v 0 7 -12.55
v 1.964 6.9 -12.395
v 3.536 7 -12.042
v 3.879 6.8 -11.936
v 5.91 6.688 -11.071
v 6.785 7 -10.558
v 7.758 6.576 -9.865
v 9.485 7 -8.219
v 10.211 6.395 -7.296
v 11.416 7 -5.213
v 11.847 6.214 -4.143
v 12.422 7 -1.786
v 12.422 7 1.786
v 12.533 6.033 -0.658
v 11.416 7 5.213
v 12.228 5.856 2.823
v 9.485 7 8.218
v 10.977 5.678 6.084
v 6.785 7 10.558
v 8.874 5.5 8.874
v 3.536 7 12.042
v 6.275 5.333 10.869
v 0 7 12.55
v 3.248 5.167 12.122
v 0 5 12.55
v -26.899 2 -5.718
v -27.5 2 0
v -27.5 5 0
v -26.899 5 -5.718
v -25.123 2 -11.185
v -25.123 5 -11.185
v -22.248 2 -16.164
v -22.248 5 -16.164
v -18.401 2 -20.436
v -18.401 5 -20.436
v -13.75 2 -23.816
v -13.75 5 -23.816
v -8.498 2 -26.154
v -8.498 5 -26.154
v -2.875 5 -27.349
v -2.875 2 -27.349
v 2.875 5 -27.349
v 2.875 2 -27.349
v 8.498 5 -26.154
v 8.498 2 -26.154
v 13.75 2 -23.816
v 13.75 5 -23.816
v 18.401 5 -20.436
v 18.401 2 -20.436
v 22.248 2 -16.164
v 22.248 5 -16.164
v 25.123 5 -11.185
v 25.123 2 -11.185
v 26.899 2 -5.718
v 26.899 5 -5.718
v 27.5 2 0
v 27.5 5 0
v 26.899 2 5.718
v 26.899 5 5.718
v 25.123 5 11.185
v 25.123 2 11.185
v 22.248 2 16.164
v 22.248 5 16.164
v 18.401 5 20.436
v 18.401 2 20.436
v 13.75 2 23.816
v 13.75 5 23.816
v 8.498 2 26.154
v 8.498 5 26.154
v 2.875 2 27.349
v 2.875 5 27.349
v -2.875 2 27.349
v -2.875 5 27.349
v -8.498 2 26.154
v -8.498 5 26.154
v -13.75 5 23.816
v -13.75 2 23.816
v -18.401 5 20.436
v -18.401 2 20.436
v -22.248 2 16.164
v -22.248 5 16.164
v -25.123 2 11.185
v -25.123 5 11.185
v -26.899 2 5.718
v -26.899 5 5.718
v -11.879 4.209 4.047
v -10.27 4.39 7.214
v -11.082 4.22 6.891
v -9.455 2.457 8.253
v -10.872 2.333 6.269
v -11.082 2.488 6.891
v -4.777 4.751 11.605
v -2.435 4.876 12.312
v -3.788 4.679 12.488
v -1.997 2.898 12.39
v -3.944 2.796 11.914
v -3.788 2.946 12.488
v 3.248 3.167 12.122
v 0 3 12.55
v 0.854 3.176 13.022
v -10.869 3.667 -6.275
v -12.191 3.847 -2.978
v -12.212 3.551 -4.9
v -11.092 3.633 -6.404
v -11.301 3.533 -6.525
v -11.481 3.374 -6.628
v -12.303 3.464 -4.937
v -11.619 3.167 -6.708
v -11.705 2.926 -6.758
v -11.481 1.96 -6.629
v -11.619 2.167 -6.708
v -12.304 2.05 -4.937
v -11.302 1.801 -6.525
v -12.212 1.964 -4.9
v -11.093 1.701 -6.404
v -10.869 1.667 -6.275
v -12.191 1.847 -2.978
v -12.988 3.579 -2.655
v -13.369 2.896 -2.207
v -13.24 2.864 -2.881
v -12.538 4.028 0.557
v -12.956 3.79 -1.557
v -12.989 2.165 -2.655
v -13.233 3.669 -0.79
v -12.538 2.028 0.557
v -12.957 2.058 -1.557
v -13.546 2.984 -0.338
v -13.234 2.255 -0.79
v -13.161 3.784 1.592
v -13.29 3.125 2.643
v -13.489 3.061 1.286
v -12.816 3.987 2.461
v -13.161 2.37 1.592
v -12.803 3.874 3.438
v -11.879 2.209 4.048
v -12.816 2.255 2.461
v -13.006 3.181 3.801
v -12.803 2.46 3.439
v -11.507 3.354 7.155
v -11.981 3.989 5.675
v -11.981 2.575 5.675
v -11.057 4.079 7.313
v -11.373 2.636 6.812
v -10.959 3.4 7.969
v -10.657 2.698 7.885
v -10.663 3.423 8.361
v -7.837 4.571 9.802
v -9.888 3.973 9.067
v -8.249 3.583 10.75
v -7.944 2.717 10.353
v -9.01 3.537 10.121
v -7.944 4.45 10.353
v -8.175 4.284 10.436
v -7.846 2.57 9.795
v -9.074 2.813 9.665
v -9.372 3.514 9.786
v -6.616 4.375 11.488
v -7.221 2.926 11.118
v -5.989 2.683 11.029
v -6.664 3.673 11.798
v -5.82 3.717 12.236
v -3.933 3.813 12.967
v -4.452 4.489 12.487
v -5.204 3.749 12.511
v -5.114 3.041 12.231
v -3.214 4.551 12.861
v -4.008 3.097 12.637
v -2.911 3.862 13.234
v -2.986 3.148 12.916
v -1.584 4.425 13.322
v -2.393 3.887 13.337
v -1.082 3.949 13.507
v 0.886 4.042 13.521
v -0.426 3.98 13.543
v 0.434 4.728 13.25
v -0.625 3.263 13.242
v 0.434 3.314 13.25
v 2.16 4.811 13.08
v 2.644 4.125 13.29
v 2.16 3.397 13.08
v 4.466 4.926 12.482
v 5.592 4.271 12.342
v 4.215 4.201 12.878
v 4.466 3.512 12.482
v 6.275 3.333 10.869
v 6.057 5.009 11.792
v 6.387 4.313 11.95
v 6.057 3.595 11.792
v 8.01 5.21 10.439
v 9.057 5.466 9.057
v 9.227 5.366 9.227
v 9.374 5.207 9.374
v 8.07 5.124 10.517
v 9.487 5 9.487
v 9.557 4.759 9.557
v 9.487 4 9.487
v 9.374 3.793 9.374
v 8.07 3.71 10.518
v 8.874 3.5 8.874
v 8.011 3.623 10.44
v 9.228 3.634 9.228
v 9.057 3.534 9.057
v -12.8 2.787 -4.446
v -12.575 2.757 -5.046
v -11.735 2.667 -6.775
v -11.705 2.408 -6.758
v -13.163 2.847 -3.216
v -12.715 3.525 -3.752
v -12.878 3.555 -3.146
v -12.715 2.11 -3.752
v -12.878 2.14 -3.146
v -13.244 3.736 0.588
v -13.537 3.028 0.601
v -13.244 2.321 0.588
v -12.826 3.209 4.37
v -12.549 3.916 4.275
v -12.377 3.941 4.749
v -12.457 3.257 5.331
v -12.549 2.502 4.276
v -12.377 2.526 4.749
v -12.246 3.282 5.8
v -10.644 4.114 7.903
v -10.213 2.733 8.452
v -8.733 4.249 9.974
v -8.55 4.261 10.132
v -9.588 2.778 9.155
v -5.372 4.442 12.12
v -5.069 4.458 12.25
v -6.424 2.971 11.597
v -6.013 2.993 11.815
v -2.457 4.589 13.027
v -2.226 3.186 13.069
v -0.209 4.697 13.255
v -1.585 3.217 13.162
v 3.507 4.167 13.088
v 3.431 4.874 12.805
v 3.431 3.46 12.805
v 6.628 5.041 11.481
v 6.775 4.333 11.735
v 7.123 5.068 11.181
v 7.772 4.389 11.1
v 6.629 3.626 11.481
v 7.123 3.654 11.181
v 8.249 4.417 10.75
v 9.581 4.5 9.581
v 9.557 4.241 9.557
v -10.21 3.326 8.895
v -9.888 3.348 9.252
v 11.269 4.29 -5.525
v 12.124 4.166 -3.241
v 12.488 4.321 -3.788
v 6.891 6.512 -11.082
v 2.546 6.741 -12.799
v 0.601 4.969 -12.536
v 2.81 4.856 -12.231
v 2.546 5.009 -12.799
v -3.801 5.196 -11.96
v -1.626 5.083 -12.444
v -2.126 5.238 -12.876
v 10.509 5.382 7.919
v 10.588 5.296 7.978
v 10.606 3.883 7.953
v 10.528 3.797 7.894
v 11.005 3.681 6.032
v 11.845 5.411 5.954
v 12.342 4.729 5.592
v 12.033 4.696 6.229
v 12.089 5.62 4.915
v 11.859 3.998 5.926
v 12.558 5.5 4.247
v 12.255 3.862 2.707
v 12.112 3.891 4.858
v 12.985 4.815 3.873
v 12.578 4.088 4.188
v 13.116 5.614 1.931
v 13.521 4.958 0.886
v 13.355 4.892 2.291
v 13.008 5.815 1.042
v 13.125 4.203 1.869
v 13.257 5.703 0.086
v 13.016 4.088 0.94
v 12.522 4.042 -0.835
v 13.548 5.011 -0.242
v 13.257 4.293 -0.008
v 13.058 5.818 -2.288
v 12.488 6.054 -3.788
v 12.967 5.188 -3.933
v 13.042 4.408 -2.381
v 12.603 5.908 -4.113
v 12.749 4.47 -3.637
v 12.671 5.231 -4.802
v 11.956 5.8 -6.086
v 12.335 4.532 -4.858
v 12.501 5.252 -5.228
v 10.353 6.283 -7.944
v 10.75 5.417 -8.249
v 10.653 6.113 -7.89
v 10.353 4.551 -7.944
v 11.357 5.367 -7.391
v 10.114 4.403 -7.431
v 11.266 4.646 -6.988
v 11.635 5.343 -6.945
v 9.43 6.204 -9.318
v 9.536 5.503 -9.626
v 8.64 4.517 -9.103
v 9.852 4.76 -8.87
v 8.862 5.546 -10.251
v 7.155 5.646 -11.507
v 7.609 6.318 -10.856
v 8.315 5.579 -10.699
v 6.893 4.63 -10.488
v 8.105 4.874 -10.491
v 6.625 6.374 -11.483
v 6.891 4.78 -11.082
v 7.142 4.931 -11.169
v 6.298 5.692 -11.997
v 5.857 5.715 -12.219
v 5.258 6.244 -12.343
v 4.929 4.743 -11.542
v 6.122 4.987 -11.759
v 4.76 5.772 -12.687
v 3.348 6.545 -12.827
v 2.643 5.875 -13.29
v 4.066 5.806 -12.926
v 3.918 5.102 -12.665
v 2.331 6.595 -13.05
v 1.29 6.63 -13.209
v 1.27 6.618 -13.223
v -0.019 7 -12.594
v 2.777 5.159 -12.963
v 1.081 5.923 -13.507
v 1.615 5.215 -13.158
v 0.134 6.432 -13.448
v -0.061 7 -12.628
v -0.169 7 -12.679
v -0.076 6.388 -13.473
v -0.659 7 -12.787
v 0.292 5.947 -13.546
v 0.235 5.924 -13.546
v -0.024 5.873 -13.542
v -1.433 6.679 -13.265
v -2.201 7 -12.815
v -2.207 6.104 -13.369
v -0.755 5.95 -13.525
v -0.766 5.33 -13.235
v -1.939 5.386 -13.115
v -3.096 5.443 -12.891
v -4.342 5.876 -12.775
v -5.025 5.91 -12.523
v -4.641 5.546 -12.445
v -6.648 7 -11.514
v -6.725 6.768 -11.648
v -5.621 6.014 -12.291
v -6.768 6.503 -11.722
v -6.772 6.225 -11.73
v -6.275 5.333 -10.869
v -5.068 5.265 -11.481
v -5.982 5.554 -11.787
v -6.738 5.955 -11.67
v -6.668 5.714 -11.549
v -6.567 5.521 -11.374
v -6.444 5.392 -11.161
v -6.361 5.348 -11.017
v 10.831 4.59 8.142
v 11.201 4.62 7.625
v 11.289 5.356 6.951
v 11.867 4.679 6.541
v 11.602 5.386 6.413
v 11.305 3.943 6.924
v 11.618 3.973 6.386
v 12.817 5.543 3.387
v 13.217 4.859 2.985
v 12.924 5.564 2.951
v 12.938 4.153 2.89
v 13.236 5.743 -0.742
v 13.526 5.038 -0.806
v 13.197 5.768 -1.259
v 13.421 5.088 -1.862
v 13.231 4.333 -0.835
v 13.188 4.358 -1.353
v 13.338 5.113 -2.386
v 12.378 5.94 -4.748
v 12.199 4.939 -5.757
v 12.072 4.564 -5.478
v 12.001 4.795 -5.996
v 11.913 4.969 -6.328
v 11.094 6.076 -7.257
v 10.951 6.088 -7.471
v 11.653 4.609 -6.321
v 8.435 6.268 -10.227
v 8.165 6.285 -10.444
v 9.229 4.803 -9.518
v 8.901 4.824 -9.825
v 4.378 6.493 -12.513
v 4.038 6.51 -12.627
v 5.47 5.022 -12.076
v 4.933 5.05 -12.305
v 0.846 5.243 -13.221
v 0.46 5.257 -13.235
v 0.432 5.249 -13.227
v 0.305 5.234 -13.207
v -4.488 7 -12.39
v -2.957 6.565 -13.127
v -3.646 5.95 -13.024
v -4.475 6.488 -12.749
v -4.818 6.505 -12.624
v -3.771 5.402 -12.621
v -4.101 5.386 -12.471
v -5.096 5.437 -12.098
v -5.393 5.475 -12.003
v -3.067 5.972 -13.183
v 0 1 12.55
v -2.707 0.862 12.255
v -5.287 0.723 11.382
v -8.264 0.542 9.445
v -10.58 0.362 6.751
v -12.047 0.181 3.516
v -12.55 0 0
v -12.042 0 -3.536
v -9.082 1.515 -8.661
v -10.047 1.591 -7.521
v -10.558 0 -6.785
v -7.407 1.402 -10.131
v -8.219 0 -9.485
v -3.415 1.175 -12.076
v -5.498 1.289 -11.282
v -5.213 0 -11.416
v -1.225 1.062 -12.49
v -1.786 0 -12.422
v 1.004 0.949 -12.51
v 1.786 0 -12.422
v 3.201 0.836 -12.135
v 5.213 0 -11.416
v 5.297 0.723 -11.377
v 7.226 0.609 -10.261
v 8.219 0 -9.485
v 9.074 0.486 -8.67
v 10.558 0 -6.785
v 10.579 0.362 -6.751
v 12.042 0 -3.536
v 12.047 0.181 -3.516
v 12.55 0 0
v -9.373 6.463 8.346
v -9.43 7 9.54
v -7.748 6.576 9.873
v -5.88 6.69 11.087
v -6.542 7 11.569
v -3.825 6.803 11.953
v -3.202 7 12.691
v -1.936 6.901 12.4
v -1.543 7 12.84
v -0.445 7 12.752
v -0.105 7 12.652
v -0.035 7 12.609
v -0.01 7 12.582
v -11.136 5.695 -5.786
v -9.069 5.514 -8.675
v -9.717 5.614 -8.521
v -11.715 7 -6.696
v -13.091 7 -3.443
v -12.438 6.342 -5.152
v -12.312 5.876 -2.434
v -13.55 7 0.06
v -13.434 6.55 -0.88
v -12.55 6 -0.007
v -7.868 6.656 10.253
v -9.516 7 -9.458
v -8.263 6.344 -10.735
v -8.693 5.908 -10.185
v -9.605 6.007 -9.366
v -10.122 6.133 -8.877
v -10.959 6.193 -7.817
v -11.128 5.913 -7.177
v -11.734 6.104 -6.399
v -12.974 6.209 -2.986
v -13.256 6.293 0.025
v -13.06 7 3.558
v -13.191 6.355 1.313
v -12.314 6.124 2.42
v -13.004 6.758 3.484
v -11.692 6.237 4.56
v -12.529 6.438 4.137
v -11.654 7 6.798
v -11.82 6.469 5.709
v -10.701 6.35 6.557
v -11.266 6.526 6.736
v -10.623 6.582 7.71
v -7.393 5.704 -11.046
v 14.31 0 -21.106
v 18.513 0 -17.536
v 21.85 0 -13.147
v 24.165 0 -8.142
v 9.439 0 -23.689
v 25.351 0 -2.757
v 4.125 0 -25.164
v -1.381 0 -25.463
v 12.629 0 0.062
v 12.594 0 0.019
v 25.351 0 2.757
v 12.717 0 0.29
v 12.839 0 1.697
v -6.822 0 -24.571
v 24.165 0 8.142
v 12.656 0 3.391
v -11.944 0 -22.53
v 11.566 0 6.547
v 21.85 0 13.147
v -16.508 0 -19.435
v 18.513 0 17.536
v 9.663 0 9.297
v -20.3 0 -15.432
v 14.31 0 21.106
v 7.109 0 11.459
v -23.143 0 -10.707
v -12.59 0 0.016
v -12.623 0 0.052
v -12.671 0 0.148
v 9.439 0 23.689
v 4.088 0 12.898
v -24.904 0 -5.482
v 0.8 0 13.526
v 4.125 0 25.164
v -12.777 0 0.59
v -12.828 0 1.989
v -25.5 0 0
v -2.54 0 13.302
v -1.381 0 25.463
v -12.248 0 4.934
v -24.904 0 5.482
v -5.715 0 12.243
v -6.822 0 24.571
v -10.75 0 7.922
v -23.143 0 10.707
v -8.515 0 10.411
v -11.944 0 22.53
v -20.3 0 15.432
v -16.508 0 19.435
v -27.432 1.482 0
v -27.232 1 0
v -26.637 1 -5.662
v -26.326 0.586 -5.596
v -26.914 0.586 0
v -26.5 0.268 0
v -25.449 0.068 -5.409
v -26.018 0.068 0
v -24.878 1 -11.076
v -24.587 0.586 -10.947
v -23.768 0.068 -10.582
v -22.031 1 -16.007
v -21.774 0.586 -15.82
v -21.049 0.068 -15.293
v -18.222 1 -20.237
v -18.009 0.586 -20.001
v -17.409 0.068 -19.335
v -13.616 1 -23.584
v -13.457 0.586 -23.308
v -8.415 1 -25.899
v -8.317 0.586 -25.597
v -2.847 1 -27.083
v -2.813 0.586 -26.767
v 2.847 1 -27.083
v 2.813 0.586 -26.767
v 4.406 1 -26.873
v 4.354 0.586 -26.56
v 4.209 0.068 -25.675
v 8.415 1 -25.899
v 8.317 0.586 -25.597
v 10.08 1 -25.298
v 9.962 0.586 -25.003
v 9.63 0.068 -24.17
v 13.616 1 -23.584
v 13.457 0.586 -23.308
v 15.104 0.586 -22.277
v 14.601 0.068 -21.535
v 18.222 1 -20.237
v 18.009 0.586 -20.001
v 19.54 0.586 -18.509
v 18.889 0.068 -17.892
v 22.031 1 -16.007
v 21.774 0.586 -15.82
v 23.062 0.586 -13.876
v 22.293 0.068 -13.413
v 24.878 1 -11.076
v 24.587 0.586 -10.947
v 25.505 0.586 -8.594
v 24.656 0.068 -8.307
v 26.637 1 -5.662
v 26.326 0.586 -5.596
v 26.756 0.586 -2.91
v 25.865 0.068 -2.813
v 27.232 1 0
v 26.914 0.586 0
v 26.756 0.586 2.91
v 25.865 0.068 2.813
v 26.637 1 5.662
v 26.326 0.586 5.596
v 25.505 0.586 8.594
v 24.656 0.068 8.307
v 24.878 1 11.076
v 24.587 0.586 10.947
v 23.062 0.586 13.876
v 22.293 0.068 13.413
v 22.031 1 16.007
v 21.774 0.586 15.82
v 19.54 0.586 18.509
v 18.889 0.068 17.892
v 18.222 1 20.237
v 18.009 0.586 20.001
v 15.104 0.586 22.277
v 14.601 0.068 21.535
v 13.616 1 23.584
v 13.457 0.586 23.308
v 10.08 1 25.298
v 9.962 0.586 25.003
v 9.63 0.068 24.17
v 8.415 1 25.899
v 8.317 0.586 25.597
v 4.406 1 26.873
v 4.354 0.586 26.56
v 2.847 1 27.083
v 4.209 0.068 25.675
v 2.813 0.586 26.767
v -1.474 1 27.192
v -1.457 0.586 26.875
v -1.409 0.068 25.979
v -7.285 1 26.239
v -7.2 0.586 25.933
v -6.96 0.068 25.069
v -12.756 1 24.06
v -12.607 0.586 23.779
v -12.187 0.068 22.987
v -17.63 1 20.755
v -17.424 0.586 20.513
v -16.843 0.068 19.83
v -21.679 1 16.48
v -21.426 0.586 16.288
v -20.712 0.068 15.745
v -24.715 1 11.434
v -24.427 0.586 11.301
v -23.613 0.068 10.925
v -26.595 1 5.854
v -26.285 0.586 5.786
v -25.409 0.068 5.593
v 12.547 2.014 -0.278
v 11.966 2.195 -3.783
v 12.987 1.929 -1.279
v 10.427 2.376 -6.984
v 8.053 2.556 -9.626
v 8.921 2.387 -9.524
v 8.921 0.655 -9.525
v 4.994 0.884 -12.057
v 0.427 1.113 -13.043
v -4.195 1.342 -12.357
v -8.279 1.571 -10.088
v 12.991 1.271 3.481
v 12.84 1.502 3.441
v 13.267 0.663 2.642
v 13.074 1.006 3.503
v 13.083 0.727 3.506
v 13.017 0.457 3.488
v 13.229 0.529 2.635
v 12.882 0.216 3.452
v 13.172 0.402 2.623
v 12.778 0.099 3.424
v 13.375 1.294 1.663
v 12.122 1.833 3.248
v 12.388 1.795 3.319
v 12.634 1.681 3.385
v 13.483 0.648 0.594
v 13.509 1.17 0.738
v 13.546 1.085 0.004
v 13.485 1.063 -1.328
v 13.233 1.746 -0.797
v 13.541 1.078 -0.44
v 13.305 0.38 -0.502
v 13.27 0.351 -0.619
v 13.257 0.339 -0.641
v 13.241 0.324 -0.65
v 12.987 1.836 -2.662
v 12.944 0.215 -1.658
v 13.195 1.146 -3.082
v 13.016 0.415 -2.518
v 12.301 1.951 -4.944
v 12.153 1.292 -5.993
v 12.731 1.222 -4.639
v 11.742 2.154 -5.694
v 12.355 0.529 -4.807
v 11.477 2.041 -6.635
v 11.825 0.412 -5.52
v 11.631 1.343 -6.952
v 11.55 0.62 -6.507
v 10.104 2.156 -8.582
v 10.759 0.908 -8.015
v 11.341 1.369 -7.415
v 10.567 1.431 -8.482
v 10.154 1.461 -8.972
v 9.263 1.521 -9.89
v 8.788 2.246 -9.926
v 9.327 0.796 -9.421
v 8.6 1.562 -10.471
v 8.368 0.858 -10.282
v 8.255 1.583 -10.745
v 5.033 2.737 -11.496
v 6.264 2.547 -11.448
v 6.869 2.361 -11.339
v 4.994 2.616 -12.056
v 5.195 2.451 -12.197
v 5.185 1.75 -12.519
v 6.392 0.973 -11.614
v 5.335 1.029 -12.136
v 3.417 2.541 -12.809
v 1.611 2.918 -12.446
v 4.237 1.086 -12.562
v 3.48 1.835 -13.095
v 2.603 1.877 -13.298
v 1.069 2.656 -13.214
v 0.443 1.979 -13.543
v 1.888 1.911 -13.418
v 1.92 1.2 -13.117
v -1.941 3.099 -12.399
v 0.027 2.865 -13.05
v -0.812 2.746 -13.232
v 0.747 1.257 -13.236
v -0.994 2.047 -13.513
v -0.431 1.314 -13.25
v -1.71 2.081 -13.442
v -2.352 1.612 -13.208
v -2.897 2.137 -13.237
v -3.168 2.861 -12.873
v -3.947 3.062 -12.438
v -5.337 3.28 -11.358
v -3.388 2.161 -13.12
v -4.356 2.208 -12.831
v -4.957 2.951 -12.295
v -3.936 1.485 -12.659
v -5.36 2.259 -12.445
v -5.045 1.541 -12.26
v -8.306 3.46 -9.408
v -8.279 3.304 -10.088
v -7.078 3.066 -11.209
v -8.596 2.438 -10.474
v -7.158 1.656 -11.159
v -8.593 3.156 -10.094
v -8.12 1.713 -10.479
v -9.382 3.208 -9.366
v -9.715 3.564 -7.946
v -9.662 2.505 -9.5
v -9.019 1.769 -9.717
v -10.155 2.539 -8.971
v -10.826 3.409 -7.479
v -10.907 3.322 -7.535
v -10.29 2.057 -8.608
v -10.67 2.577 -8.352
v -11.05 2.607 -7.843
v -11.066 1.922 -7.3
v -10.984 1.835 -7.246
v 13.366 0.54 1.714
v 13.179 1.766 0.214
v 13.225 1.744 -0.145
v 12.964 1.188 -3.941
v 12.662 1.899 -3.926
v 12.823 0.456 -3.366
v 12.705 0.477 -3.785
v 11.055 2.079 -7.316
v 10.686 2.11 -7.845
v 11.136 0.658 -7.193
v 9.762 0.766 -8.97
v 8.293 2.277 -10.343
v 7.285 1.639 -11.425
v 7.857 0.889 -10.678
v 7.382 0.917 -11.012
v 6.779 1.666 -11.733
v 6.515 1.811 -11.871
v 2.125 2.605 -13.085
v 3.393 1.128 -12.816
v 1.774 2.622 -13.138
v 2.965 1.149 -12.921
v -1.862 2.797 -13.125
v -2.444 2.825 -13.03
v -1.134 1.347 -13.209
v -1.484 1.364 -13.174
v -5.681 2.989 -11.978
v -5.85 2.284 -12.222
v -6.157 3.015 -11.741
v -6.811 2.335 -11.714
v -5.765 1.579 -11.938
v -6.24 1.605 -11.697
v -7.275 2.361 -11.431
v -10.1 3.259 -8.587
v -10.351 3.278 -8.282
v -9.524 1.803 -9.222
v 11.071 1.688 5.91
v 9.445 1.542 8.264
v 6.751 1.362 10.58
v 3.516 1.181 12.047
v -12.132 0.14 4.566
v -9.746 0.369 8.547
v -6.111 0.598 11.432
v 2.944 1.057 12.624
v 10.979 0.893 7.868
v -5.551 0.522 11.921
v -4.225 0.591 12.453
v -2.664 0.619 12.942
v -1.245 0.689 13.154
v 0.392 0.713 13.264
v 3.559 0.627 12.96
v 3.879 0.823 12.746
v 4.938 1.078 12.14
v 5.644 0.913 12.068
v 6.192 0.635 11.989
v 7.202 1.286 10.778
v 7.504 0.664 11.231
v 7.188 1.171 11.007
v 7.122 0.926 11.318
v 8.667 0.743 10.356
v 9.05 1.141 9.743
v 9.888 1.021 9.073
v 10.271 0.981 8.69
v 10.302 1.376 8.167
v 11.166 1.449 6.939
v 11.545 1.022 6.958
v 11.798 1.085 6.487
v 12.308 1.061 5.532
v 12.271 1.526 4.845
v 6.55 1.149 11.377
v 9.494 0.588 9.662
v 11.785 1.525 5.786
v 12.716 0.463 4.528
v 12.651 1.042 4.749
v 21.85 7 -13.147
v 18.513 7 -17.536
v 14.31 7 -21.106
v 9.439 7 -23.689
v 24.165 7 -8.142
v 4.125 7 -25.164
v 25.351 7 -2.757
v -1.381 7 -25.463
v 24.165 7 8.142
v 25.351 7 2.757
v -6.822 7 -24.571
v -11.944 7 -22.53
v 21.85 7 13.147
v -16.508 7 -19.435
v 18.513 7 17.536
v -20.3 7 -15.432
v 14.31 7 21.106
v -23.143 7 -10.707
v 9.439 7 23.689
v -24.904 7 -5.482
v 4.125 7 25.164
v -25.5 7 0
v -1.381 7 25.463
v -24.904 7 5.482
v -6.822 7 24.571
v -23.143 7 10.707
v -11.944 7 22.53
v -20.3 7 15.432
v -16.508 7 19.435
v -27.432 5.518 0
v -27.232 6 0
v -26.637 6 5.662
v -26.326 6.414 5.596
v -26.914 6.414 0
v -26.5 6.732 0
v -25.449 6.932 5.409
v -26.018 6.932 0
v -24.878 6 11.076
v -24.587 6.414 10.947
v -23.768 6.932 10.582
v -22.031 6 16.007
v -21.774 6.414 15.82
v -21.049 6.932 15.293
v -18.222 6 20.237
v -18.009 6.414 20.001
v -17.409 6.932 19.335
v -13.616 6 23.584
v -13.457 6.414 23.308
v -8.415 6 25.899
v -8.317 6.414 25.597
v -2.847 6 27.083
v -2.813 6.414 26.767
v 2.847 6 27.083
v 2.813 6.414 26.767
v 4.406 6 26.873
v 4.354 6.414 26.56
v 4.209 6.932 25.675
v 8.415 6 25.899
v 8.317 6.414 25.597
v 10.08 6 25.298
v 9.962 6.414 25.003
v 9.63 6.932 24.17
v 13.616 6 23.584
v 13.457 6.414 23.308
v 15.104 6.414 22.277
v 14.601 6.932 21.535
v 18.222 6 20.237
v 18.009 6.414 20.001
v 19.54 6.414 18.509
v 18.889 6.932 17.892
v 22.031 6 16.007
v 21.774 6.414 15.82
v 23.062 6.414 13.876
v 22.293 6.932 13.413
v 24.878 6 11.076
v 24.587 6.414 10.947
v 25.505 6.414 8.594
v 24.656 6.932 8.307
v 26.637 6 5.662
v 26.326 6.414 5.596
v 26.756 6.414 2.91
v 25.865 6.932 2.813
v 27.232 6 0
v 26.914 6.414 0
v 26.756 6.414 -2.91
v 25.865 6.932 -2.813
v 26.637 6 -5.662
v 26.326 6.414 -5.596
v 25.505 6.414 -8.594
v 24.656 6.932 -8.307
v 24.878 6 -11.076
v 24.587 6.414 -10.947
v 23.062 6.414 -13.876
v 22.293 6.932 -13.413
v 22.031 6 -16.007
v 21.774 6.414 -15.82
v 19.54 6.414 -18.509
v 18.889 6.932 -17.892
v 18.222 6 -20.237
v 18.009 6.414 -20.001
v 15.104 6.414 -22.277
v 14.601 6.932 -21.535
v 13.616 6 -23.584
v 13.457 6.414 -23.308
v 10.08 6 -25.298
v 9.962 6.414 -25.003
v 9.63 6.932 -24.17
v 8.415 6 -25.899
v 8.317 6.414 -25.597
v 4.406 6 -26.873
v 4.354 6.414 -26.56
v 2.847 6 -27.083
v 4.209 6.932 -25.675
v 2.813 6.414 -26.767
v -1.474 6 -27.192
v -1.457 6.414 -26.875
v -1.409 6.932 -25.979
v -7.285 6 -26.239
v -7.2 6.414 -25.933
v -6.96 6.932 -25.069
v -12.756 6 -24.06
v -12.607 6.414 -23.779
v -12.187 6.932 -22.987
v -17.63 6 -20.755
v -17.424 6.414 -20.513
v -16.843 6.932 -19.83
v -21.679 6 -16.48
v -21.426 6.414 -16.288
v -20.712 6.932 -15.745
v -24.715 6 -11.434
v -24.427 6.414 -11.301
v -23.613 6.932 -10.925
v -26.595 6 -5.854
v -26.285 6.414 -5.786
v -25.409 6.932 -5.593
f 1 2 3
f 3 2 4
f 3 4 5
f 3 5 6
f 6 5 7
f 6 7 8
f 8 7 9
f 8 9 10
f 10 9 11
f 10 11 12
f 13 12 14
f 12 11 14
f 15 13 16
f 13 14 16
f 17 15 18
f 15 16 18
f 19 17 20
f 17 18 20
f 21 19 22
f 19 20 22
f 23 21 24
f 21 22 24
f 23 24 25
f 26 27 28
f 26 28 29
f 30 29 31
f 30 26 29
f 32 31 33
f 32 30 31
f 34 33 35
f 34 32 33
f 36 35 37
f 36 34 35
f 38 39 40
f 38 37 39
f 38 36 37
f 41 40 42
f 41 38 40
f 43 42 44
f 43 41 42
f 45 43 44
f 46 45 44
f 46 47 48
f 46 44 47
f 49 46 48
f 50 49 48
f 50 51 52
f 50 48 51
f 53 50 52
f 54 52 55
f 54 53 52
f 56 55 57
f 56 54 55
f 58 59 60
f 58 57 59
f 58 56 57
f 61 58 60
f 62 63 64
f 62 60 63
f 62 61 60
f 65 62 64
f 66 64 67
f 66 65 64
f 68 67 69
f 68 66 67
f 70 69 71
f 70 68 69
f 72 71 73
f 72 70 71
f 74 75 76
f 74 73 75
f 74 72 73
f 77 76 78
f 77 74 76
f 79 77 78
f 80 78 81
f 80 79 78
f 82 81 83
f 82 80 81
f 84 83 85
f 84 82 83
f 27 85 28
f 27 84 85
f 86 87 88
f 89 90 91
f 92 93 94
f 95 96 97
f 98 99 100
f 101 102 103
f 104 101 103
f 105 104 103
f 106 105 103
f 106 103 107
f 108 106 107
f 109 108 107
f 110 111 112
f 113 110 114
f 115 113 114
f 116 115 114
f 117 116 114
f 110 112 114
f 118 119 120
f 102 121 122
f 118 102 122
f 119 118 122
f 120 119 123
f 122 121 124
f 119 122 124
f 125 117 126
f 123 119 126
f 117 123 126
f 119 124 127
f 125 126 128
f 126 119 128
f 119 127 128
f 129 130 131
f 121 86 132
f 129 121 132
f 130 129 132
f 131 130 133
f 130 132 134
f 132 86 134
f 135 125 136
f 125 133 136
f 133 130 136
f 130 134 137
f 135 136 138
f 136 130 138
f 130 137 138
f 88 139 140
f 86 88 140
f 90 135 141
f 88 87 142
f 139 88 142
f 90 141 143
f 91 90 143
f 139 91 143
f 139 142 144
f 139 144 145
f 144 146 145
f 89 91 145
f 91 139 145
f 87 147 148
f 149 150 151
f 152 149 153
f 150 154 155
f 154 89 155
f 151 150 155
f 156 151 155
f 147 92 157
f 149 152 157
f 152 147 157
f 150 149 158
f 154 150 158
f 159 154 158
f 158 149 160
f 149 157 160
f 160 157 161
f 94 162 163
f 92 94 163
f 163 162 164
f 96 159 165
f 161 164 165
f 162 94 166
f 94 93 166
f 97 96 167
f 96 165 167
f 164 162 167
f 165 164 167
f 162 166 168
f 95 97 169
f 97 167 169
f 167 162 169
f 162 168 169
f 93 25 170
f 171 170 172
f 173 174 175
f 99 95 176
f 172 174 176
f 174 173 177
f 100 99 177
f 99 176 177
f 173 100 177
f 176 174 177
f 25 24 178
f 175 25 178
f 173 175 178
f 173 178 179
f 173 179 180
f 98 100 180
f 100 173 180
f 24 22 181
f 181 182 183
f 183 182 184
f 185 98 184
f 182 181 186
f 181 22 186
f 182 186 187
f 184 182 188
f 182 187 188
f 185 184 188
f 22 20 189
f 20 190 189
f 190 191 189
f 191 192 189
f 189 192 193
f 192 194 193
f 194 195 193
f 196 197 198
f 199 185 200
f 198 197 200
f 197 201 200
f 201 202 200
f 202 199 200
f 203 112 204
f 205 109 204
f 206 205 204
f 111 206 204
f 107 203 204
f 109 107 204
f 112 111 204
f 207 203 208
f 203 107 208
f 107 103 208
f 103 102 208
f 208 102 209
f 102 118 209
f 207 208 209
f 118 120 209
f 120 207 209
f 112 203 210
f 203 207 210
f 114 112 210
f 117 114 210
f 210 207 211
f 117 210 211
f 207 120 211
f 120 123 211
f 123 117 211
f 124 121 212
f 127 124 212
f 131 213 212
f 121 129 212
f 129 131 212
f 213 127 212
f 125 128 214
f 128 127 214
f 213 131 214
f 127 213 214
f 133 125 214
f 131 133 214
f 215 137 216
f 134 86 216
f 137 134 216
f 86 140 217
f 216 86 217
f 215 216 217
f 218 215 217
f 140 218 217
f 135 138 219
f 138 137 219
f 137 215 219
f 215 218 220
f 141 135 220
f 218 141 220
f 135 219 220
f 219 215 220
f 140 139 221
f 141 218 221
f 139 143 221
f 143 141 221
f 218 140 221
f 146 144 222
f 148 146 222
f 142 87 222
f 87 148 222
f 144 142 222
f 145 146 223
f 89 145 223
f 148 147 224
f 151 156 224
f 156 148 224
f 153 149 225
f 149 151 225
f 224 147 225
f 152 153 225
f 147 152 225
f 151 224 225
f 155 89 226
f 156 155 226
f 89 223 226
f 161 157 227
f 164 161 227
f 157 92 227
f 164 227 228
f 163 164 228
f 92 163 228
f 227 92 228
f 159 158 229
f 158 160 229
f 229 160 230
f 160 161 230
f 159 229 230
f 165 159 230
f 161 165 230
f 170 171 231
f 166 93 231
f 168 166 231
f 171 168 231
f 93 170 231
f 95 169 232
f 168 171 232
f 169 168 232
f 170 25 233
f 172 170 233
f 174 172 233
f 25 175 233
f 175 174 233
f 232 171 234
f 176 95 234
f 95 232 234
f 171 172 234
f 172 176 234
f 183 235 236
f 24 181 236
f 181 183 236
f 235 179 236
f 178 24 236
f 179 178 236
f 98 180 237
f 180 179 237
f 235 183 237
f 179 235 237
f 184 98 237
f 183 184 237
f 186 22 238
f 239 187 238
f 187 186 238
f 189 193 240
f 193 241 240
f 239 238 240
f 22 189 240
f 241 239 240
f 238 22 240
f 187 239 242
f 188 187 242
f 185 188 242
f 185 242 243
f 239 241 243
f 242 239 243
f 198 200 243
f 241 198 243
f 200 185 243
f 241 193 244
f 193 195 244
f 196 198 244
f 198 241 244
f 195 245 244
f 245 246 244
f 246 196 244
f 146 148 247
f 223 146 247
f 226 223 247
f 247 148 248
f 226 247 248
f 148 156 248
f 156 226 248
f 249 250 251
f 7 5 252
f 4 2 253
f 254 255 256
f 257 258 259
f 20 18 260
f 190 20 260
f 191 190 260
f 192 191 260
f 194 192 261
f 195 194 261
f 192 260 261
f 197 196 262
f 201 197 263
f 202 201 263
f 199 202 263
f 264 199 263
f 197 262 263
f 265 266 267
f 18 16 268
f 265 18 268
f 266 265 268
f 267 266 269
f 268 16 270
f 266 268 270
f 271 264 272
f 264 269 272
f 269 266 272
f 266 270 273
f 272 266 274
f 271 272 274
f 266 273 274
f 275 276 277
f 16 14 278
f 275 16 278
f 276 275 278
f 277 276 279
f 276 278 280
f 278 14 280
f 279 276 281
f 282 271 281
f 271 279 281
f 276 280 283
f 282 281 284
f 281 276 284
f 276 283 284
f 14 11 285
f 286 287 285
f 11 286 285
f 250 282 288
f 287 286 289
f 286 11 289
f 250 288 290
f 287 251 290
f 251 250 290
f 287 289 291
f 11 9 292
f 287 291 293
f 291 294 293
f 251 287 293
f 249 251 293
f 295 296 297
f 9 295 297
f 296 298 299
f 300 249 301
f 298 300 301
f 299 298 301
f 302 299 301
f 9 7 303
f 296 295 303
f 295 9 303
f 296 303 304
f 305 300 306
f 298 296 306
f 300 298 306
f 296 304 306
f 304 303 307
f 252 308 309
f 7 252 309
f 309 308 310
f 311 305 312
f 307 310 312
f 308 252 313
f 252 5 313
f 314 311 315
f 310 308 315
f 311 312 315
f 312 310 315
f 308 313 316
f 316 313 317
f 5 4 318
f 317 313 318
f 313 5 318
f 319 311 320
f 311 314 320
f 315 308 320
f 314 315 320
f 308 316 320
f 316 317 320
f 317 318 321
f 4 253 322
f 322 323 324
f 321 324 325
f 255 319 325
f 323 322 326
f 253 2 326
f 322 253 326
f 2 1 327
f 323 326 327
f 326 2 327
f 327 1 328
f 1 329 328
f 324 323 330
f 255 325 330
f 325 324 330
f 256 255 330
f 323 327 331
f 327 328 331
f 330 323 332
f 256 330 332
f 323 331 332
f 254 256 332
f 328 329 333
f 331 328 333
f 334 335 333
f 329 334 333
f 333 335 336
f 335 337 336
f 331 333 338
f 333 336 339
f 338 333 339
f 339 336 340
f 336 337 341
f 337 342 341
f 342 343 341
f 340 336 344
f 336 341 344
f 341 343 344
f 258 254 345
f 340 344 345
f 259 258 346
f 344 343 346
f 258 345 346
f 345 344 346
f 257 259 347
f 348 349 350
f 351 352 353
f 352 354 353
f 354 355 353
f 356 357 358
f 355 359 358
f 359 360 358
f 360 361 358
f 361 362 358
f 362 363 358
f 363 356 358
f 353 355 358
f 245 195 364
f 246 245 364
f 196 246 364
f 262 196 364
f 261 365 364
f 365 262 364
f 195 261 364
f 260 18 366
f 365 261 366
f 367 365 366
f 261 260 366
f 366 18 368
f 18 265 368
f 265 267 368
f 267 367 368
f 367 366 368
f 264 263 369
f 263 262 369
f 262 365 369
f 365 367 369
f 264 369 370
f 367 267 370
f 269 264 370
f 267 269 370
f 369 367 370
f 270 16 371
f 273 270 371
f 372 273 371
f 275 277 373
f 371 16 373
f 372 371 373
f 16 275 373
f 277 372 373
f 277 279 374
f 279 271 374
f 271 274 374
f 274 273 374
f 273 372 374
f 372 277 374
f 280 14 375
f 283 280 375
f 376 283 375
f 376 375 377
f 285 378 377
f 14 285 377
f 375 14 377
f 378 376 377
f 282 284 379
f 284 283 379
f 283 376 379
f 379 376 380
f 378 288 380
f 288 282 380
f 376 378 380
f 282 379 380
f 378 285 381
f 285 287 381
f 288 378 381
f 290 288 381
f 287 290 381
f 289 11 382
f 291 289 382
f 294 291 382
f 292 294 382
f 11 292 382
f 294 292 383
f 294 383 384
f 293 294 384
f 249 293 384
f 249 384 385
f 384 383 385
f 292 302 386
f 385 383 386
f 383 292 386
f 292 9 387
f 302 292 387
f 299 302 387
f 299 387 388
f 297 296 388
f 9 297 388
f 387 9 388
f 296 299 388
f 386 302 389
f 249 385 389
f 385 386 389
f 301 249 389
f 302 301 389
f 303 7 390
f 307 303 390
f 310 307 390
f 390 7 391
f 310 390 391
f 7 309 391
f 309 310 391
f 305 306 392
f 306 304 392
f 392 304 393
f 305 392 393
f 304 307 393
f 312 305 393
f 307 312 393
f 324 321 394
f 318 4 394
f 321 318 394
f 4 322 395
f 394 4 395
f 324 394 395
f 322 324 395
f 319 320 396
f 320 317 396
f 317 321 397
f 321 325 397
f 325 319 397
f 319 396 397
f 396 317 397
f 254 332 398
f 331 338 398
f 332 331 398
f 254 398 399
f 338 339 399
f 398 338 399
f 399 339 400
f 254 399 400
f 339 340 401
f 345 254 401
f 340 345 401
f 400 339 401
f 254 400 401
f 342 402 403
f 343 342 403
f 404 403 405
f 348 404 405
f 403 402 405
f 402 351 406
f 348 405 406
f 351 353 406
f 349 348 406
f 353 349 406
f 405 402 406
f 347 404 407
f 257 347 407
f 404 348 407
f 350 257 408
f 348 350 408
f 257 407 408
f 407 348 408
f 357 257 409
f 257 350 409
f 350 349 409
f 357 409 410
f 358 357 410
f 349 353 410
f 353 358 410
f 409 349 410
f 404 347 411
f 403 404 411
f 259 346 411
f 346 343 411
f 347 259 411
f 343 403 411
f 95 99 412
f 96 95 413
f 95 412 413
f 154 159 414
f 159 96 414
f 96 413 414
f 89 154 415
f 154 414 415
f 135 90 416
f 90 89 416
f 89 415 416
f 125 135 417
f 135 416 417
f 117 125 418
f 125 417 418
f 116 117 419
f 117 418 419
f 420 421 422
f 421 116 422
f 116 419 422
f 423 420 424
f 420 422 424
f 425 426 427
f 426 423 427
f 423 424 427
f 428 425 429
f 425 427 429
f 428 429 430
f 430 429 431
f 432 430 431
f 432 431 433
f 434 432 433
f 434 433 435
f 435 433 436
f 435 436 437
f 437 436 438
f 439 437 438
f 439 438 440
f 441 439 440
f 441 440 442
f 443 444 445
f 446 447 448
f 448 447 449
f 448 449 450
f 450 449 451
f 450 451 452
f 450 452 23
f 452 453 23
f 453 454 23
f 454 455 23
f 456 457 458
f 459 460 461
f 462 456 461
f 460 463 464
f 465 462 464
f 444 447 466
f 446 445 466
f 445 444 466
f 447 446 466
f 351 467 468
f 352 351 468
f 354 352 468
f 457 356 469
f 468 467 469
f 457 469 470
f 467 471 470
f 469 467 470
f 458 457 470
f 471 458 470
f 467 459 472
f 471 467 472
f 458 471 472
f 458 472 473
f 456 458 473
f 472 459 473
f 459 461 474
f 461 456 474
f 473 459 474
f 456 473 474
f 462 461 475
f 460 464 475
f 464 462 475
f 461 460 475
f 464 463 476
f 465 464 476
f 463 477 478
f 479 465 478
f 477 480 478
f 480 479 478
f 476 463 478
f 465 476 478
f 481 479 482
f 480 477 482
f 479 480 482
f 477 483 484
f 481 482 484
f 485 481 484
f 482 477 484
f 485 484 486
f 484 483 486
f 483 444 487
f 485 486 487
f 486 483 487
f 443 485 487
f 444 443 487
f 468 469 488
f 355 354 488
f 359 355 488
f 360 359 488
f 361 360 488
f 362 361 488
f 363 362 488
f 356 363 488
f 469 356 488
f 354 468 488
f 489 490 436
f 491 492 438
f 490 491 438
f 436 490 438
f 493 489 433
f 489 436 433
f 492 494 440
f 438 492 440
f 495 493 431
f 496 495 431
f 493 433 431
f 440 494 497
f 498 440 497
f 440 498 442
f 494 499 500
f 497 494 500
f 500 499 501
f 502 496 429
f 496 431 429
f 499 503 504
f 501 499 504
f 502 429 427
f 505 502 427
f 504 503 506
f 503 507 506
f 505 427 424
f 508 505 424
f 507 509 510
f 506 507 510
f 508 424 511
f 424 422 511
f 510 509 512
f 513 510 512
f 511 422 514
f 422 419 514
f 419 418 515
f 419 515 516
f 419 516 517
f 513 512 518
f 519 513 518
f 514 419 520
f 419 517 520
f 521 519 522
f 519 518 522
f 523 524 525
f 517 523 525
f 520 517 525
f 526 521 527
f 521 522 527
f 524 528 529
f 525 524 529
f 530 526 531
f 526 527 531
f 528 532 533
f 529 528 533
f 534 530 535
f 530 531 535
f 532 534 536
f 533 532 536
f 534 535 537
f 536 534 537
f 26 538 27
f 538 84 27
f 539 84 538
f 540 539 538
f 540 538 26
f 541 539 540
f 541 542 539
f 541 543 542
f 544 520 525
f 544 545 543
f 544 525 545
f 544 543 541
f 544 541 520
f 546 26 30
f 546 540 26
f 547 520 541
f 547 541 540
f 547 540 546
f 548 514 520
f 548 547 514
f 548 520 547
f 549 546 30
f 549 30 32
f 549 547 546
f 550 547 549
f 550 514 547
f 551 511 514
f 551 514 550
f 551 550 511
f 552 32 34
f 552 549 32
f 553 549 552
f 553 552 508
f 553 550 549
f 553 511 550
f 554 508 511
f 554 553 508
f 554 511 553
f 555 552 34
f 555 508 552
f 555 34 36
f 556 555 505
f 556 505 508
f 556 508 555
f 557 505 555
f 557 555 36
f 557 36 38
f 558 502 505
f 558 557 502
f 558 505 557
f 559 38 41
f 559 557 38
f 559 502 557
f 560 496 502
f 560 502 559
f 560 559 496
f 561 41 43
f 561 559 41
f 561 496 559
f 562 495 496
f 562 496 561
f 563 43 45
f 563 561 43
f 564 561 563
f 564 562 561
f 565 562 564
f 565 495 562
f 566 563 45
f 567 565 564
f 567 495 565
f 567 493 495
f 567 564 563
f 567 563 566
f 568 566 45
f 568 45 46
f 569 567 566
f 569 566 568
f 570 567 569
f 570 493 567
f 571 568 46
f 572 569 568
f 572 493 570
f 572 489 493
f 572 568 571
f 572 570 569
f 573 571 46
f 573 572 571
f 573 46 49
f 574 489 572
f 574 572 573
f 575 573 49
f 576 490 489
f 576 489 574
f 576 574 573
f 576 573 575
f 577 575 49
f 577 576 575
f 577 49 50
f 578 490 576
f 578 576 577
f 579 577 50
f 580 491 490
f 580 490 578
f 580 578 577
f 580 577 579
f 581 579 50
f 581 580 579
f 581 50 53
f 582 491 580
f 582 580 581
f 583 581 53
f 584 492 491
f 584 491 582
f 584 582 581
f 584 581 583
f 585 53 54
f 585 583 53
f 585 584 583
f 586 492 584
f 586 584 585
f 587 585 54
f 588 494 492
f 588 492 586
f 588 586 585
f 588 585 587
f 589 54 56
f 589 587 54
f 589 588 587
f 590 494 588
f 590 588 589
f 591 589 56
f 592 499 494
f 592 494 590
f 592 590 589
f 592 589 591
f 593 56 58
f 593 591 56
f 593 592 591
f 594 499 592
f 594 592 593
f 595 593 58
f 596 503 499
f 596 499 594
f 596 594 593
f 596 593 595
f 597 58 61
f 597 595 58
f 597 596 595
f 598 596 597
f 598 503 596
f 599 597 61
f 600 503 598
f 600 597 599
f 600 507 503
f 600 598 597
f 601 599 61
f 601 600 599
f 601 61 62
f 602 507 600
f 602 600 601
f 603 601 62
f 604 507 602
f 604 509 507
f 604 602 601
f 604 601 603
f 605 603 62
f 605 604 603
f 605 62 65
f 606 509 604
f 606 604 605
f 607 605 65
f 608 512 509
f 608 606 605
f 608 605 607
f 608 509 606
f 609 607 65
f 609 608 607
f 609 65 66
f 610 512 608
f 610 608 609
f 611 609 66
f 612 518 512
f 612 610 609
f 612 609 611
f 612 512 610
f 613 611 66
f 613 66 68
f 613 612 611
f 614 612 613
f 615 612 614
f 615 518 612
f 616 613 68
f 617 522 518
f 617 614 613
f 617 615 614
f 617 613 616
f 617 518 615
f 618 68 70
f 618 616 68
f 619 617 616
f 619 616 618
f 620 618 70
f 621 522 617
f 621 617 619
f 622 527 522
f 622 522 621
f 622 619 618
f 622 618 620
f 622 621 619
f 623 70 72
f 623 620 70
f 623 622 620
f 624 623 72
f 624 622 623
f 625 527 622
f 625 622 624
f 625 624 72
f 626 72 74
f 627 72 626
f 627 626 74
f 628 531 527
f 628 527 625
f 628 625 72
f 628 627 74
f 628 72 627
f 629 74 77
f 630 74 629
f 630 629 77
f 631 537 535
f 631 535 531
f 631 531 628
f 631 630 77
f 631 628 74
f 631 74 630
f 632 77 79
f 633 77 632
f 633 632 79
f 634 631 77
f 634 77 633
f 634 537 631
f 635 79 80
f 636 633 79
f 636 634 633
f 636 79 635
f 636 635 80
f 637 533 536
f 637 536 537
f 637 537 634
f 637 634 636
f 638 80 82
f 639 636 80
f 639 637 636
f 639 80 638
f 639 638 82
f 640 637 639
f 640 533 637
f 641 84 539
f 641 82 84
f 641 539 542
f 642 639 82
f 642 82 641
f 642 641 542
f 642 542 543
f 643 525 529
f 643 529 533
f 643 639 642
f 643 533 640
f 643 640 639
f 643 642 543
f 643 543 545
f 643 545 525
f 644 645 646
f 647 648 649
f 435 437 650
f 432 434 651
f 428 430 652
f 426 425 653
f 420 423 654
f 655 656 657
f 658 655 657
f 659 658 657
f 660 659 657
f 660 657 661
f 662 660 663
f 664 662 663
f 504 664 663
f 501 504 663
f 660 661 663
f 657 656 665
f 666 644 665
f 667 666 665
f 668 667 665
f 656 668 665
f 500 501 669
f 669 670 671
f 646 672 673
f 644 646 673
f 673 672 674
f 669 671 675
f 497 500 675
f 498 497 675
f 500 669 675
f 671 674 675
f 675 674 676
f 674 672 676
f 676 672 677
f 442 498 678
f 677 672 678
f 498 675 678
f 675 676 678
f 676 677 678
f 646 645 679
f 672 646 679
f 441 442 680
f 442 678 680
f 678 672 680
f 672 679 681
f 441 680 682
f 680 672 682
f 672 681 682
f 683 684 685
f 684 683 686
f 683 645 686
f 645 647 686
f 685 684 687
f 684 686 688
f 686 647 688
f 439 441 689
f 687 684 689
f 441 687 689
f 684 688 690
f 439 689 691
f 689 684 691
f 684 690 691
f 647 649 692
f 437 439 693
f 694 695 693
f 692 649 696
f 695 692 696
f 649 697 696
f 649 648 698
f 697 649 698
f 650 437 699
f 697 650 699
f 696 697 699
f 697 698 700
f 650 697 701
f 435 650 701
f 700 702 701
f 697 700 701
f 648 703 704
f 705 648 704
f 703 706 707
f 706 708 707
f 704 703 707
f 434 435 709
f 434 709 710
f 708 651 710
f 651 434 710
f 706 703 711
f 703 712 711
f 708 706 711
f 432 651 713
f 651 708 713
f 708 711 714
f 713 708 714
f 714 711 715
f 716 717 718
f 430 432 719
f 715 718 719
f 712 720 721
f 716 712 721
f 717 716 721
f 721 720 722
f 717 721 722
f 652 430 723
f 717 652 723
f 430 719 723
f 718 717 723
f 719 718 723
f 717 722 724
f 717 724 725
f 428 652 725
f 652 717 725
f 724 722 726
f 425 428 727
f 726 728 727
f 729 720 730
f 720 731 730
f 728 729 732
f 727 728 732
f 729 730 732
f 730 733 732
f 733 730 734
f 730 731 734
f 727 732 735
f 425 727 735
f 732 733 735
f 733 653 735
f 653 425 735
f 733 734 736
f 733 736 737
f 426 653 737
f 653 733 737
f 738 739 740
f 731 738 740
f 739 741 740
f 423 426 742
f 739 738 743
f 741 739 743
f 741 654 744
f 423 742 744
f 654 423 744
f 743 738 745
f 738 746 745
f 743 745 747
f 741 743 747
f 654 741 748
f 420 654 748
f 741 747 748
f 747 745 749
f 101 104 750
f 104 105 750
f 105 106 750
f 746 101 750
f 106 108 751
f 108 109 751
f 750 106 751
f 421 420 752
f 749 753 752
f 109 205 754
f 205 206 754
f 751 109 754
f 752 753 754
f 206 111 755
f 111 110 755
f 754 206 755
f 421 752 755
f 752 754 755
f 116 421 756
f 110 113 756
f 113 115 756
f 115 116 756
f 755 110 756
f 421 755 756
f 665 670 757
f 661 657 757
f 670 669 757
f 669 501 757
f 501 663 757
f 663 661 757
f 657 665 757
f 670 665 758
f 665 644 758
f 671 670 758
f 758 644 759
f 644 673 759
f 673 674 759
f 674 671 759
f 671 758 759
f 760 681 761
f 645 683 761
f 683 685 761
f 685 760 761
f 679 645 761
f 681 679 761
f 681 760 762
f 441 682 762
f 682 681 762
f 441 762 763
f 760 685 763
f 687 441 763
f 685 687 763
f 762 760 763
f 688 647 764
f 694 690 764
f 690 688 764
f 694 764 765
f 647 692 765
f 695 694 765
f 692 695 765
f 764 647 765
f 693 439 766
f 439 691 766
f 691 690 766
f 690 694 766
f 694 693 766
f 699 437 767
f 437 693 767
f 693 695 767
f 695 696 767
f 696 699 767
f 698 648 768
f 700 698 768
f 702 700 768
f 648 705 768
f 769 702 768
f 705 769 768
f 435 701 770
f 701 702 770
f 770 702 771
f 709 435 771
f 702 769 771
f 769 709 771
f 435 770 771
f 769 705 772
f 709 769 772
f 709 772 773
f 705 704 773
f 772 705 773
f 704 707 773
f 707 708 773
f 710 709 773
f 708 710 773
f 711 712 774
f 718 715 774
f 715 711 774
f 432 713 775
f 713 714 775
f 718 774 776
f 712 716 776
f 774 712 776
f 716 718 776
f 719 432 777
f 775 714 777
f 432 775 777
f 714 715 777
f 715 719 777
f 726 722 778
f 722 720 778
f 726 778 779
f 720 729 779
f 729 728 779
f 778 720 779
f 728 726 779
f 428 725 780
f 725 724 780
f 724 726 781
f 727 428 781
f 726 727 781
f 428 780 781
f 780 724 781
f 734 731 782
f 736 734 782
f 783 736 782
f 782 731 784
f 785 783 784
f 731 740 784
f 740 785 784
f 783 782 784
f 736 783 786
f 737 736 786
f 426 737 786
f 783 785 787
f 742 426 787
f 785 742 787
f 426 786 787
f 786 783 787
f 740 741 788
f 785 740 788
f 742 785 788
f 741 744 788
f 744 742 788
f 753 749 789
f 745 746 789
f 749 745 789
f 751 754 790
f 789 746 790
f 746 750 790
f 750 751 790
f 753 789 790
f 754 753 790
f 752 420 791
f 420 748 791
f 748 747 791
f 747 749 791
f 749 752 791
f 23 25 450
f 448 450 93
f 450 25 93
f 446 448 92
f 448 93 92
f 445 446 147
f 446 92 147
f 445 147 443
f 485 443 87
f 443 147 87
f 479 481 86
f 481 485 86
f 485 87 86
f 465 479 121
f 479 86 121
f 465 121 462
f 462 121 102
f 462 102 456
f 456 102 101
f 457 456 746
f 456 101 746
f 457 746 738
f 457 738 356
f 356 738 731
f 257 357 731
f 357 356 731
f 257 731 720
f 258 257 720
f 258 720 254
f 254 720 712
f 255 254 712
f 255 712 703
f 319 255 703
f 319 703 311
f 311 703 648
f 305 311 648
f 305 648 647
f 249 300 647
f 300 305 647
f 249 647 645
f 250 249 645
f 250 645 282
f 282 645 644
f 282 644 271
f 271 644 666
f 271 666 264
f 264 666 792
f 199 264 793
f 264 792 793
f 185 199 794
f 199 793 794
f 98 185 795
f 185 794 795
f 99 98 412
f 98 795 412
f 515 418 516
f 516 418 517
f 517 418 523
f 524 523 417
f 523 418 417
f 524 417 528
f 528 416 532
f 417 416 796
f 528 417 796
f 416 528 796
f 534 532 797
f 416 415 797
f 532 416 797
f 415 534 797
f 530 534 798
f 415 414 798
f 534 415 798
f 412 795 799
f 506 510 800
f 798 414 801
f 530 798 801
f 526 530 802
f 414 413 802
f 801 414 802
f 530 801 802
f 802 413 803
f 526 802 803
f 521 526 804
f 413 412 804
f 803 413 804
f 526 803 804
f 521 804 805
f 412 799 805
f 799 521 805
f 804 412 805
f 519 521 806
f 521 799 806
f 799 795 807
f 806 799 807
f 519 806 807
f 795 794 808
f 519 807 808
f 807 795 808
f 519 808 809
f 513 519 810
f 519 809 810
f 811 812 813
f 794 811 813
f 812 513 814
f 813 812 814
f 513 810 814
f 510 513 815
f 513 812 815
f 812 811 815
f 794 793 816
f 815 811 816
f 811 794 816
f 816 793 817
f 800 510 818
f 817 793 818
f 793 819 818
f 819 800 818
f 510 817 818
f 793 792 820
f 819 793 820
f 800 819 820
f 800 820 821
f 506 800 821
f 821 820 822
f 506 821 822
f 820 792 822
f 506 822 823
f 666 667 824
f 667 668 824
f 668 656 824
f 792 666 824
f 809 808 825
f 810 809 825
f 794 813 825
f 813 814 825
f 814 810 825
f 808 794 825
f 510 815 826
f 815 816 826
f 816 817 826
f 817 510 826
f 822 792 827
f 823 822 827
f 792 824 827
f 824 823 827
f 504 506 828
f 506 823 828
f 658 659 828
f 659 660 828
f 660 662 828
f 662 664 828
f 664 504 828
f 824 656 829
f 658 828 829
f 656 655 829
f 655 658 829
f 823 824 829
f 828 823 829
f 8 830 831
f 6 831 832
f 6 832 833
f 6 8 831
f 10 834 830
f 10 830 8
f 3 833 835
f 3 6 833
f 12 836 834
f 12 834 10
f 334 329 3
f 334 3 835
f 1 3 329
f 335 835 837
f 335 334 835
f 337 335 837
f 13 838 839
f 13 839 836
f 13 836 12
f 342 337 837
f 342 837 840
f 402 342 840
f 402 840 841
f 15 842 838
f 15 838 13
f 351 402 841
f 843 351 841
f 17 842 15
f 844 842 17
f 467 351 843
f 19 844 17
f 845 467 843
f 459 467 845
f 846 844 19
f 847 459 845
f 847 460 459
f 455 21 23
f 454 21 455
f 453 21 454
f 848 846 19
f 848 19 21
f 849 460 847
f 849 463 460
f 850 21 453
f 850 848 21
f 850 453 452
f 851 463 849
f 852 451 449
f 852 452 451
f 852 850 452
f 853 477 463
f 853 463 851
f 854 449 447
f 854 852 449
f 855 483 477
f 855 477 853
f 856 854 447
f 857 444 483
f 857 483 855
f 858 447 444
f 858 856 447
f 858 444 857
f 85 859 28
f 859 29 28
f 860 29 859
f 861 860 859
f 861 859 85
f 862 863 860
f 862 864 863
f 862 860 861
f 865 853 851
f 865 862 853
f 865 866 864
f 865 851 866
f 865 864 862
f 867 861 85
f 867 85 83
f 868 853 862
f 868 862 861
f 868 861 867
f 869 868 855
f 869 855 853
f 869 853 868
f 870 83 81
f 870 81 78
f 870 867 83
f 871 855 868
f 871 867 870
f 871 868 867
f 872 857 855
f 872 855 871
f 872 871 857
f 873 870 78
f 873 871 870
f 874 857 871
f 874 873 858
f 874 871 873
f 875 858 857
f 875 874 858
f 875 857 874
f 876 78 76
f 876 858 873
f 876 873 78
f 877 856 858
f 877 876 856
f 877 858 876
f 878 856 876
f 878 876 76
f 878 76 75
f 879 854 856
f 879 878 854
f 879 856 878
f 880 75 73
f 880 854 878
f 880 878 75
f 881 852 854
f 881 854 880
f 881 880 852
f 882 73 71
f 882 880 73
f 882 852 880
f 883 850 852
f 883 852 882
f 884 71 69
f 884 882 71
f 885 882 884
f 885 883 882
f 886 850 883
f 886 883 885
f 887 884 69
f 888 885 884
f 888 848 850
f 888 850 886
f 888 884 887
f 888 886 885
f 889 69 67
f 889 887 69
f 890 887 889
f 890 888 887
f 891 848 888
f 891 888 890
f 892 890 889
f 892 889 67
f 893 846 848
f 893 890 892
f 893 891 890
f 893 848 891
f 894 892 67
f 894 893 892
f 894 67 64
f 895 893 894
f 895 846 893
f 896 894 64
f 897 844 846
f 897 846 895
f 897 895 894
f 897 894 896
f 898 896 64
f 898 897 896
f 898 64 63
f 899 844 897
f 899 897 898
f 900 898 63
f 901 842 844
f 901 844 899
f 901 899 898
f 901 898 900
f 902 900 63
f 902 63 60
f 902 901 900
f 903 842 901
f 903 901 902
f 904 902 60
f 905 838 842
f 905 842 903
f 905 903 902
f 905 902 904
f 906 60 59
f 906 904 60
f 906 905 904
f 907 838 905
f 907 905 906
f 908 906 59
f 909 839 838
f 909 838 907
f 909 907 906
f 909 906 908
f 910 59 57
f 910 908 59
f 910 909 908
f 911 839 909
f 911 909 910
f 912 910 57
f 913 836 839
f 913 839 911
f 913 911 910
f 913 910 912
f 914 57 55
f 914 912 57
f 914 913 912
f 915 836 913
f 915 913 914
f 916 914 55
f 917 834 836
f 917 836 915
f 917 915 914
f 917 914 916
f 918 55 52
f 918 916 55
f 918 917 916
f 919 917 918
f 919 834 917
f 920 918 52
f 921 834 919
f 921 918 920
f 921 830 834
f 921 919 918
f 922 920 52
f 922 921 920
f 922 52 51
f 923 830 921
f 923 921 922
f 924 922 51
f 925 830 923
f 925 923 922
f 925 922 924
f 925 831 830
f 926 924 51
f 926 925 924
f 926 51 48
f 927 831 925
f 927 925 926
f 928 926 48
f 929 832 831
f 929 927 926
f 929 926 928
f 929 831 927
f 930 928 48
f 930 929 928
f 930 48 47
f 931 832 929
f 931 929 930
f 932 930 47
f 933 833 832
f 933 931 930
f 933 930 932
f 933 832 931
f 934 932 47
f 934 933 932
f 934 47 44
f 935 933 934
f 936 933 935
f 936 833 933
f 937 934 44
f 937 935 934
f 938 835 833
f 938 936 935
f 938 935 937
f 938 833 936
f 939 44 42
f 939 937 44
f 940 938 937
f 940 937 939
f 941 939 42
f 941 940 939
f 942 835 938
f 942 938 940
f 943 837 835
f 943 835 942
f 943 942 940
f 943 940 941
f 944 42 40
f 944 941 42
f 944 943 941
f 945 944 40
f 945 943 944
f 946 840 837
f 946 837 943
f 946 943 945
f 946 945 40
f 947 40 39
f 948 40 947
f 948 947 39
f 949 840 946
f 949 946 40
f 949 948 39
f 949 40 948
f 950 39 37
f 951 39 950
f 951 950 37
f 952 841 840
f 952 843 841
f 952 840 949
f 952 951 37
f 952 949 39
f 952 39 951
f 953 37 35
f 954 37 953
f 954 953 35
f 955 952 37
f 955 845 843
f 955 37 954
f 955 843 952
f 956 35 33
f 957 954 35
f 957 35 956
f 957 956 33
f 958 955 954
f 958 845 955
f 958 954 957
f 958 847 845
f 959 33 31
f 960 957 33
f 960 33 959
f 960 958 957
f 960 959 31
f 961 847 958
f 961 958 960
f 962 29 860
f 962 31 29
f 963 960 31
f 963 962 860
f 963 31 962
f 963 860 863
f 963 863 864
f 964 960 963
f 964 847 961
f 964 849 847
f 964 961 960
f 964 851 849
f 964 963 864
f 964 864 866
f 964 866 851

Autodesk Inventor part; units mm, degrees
ref_plane "YZ Plane" through (0, 0, 0) normal (1, 0, 0) x (0, 1, 0)
ref_plane "XZ Plane" through (0, 0, 0) normal (0, 1, 0) x (-1, 0, 0)
ref_plane "XY Plane" through (0, 0, 0) normal (0, 0, 1) x (1, 0, 0)
sketch "Sketch1" plane through (0, 0, 0) normal (0, 1, 0) x (-1, 0, 0)
  circle A0 centre (0, 0) radius 27.5
  dimension "d0" = 55
extrude "Extrusion1" add sketch "Sketch1" along normal blind 7
sketch "Sketch2" plane through (0, 7, 0) normal (0, 1, 0) x (1, 0, 0)
  circle A0 centre (0, 0) radius 27.5 projected
hole "Hole1" at (0, 7, 0) direction (0, -1, 0) diameter 25.1 end through all
sketch "Sketch9" plane through (0, 0, 0) normal (0, 0, 1) x (1, 0, 0)
  circle A0 centre (-12.55, -1) radius 1
  line L0 (12.55, 0) -> (-12.55, 0) projected
  point P0 (0, 0)
  dimension "d52" = 2
  dimension "d53" = 1
coil "Coil4" sketch "Sketch9" operation cut axis through (0, -10, 0) along (0, 1, 0) pitch 4 turns 2.75 hand right
fillet "Fillet1" radius 2 2 edges at (27.5, 7, 0) (27.5, 0, 0)
properties part number "screwspoolv3"
